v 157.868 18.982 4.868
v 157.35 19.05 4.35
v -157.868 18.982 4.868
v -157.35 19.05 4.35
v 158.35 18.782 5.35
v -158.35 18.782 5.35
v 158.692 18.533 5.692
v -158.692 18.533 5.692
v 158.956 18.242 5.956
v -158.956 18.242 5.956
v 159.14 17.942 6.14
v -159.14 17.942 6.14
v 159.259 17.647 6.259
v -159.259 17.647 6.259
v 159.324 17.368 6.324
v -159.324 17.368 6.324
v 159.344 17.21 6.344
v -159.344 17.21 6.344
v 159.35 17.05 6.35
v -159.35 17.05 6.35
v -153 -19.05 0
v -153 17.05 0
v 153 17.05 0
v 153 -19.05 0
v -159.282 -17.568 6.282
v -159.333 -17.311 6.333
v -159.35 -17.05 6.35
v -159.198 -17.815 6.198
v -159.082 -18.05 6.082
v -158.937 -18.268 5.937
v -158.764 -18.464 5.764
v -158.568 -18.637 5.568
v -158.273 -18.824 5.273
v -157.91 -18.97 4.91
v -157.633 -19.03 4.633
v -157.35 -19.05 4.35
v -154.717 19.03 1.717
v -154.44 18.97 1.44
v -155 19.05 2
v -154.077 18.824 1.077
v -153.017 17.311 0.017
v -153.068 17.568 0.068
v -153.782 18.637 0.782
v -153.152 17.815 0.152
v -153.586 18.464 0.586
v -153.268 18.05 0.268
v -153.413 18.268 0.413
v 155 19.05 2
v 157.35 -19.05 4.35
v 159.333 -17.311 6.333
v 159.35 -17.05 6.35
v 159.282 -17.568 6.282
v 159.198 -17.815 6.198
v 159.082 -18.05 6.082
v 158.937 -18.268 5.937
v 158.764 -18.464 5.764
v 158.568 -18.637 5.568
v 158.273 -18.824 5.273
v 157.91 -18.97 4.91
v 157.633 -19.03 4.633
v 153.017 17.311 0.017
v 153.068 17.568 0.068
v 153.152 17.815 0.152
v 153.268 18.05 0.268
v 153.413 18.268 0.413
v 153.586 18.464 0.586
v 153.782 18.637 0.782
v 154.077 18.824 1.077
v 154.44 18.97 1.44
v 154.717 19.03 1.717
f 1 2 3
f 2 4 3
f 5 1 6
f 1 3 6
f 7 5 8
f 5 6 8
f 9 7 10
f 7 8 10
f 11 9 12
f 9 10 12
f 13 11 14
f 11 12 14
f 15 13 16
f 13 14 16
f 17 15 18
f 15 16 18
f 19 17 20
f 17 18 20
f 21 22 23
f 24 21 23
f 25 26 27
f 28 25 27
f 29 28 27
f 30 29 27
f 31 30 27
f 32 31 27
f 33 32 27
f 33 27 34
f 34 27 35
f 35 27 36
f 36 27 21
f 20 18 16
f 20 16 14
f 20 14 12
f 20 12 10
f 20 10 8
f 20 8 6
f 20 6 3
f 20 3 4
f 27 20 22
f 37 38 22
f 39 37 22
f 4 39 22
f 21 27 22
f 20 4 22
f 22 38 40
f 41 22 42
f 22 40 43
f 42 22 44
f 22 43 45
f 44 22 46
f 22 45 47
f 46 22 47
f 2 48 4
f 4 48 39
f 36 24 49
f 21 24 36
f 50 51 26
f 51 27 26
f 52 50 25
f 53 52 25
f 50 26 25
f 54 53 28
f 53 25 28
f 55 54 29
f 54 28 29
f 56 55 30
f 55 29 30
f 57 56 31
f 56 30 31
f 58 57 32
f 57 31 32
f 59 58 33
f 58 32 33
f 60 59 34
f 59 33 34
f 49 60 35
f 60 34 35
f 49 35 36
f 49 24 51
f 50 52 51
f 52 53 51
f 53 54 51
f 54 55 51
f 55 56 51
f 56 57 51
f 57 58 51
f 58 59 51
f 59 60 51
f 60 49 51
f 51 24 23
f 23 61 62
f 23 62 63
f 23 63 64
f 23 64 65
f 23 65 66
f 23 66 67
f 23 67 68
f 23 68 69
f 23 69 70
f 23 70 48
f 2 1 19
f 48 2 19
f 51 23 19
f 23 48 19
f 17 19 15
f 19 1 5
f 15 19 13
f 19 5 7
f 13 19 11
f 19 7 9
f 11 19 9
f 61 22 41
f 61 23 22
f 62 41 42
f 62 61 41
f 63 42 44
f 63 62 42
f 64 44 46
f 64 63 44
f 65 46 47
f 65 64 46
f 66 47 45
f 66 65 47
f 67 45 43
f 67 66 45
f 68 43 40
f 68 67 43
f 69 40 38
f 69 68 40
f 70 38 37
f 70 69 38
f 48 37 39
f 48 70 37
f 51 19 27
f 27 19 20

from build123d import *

# Parameters (mm, degrees)
BOSS_EXTRUDE1_DEPTH = 19.05
FILLET1_R           = 2


with BuildPart() as part:
    # Sketch1 → Boss-Extrude1 (new body, symmetric)
    with BuildSketch(Plane(origin=(0, 0, 0), x_dir=(1, 0, 0), z_dir=(0, 1, 0))):
        Polygon((-153, 0), (153, 0), (159.35, -6.35), (-159.35, -6.35), align=None)
    extrude(amount=BOSS_EXTRUDE1_DEPTH, both=True)

    # Fillet1
    fillet1_edges = [part.edges().sort_by_distance(p)[0] for p in [
        (0, 19.05, 0),
        (0, -19.05, 6.35),
        (0, 19.05, 6.35),
    ]]
    fillet(fillet1_edges, radius=FILLET1_R)


solid = part.part
